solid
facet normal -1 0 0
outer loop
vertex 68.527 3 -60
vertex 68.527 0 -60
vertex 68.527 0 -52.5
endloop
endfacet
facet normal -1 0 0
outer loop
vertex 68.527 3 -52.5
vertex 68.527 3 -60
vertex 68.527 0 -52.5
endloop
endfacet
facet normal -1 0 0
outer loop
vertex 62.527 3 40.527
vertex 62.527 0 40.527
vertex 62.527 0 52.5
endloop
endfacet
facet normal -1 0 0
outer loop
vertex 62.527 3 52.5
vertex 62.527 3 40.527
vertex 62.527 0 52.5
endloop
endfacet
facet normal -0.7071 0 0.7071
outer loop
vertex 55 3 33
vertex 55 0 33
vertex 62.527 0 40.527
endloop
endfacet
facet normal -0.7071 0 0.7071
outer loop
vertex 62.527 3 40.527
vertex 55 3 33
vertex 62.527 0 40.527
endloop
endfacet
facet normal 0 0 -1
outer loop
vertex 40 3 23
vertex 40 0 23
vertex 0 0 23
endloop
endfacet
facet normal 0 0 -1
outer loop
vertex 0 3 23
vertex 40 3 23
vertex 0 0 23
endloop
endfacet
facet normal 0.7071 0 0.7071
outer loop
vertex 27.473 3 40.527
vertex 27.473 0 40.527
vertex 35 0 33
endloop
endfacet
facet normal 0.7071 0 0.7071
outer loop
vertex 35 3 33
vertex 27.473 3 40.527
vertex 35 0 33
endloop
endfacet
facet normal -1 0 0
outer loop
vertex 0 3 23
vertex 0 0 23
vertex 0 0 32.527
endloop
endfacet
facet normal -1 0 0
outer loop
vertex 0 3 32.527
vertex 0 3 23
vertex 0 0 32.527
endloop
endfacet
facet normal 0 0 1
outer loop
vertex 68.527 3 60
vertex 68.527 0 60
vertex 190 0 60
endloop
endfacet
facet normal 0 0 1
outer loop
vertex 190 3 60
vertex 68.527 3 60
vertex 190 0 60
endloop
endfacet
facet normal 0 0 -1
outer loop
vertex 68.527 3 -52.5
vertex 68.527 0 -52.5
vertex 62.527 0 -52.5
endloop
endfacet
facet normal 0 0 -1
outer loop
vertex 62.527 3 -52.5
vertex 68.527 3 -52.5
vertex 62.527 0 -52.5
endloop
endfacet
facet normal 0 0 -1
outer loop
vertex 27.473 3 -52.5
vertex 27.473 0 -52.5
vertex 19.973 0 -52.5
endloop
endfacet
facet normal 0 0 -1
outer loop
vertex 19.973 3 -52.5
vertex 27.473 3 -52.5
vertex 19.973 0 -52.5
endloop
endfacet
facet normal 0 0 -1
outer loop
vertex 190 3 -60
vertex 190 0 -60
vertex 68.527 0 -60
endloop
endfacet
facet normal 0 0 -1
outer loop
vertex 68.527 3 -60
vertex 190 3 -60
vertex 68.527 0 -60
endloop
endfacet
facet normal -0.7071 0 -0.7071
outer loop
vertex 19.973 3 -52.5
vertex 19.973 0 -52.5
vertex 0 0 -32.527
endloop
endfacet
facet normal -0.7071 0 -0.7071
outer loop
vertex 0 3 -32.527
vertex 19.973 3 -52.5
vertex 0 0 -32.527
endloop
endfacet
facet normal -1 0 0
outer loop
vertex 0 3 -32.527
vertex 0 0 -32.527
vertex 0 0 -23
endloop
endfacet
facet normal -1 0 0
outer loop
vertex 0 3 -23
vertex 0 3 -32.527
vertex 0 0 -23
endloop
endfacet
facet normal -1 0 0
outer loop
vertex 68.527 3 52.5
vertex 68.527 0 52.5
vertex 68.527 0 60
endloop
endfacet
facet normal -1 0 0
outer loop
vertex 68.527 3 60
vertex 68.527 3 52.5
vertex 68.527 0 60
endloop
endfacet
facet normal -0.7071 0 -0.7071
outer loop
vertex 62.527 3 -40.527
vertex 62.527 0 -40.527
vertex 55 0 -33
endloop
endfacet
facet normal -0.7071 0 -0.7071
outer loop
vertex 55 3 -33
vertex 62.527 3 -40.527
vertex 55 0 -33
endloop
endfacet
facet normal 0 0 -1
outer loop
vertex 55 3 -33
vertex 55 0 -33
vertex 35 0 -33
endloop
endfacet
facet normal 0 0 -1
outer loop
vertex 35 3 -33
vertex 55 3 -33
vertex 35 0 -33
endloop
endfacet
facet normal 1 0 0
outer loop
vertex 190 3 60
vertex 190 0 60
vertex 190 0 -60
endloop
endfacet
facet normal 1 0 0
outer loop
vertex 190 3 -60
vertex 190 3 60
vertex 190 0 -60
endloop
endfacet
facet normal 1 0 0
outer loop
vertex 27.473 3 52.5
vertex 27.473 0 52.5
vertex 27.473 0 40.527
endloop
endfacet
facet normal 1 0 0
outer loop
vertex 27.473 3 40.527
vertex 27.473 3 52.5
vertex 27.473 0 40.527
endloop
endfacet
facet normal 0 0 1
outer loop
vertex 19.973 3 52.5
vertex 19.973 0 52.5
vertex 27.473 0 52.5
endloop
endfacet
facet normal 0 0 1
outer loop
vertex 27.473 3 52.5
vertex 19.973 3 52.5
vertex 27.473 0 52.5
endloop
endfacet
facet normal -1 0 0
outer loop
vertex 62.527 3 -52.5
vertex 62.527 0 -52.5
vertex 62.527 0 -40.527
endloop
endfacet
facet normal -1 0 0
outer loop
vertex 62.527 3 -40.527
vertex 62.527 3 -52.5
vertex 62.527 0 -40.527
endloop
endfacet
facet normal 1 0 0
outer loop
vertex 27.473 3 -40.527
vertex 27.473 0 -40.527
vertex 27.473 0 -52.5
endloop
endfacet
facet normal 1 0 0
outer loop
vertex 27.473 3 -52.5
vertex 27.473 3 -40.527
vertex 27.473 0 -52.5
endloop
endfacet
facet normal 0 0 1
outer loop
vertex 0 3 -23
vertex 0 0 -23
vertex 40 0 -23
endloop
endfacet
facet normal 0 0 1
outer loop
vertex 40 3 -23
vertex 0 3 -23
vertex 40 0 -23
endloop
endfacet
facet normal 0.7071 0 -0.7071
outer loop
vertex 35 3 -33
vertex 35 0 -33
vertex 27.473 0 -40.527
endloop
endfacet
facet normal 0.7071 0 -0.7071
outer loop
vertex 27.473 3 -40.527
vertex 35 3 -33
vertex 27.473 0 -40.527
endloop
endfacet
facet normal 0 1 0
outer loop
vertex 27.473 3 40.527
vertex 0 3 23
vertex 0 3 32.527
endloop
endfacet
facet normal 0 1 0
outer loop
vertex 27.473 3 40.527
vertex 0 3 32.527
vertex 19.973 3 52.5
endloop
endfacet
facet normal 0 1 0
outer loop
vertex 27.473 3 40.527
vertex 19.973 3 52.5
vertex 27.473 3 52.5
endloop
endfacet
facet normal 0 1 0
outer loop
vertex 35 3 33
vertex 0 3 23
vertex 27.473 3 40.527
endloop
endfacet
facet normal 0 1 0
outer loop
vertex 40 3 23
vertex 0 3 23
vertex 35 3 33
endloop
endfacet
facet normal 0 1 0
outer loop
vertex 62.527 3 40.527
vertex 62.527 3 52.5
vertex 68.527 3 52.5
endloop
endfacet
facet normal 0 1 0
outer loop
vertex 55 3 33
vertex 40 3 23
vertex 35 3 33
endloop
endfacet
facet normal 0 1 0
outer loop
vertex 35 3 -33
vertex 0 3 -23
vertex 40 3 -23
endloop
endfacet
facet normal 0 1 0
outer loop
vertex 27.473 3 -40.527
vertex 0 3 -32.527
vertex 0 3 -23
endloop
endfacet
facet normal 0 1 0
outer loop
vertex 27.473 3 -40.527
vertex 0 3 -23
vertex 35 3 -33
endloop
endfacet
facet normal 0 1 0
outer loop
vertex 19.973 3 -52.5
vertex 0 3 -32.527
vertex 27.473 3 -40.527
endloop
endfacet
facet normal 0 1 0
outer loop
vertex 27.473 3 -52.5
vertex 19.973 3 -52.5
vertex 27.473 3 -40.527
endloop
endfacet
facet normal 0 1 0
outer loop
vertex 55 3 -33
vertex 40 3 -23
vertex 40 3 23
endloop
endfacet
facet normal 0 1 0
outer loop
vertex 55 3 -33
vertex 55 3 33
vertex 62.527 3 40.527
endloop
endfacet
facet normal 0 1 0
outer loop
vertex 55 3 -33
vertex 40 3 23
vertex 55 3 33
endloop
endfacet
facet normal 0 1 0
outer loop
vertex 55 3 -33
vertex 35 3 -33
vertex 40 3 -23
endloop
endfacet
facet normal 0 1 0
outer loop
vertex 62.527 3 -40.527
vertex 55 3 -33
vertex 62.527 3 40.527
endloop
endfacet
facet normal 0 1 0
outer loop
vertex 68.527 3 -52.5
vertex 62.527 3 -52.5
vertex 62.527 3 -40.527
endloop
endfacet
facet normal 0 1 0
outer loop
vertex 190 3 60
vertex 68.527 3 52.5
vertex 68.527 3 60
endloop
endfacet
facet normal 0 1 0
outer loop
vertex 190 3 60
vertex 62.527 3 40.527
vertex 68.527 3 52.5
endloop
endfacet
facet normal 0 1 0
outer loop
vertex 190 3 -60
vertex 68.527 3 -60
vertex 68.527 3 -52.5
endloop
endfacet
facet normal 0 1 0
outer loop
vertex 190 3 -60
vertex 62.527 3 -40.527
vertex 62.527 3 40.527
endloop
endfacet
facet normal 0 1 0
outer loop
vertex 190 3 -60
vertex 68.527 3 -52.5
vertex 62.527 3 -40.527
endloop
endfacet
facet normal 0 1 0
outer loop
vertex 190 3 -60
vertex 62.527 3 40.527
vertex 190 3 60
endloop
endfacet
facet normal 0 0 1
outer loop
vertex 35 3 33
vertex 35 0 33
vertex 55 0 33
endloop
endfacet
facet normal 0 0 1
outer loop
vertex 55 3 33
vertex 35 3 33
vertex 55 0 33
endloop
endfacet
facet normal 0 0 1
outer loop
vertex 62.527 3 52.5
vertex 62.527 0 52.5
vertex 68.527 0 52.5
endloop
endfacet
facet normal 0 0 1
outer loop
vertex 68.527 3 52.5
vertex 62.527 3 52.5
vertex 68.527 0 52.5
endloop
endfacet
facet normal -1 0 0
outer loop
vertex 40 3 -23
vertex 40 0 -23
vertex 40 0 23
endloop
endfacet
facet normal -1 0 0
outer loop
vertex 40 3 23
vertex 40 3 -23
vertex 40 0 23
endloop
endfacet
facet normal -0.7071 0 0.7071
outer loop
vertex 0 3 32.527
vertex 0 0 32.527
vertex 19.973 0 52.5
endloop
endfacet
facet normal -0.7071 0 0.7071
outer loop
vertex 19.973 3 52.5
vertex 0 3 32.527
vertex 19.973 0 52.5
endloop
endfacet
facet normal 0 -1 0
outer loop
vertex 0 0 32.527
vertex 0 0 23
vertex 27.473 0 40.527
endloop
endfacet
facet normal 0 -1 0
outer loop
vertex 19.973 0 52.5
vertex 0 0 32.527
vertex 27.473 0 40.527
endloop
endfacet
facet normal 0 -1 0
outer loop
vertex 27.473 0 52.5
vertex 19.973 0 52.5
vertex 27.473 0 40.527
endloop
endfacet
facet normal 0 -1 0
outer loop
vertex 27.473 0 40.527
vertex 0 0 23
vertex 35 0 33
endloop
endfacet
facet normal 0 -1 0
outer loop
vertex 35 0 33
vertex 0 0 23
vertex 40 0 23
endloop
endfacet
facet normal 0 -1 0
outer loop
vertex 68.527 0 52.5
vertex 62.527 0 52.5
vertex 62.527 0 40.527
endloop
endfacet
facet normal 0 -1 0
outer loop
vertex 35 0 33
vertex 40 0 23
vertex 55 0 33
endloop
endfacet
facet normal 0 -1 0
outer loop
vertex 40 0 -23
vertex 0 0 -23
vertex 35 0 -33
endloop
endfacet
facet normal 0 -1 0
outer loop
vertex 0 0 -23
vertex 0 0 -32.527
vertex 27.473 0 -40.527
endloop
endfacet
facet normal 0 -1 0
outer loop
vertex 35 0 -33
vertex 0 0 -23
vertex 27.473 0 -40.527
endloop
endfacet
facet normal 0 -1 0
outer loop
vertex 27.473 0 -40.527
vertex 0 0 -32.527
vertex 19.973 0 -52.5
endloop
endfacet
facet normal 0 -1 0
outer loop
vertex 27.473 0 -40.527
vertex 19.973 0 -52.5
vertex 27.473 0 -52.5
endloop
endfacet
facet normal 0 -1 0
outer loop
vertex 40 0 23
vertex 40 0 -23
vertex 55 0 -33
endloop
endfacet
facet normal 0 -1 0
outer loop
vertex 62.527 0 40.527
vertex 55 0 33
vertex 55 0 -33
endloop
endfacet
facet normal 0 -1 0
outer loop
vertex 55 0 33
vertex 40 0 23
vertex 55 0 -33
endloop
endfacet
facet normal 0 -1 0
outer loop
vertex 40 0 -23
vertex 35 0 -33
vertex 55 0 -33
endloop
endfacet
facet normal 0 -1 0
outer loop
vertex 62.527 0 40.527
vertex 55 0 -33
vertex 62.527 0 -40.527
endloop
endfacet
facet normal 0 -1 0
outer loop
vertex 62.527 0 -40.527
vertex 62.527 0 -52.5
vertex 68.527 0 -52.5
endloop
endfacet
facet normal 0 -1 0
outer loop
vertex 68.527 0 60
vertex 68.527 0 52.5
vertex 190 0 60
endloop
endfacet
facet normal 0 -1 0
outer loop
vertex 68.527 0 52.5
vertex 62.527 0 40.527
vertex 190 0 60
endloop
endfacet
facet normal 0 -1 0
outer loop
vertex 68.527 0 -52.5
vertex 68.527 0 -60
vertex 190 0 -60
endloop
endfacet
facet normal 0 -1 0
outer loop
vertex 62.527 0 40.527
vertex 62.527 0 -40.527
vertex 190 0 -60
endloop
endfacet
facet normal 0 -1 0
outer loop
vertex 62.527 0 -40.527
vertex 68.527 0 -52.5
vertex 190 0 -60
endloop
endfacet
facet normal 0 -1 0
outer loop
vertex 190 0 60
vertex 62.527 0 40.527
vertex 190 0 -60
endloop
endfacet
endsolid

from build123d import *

# Parameters (mm, degrees)
BOSS_EXTRUDE1_DEPTH = 3


with BuildPart() as part:
    # Sketch1 → Boss-Extrude1 (new body)
    with BuildSketch(Plane(origin=(0, 0, 0), x_dir=(1, 0, 0), z_dir=(0, 1, 0))):
        Polygon((68.526631134, -52.5), (68.526631134, -60), (190, -60), (190, 60), (68.526631134, 60), (68.526631134, 52.5), (62.526631134, 52.5), (62.526631134, 40.526631134), (55, 33), (35, 33), (27.473368866, 40.526631134), (27.473368866, 52.5), (19.973368866, 52.5), (0, 32.526631134), (0, 23), (40, 23), (40, -23), (0, -23), (0, -32.526631134), (19.973368866, -52.5), (27.473368866, -52.5), (27.473368866, -40.526631134), (35, -33), (55, -33), (62.526631134, -40.526631134), (62.526631134, -52.5), align=None)
    extrude(amount=BOSS_EXTRUDE1_DEPTH)


solid = part.part
